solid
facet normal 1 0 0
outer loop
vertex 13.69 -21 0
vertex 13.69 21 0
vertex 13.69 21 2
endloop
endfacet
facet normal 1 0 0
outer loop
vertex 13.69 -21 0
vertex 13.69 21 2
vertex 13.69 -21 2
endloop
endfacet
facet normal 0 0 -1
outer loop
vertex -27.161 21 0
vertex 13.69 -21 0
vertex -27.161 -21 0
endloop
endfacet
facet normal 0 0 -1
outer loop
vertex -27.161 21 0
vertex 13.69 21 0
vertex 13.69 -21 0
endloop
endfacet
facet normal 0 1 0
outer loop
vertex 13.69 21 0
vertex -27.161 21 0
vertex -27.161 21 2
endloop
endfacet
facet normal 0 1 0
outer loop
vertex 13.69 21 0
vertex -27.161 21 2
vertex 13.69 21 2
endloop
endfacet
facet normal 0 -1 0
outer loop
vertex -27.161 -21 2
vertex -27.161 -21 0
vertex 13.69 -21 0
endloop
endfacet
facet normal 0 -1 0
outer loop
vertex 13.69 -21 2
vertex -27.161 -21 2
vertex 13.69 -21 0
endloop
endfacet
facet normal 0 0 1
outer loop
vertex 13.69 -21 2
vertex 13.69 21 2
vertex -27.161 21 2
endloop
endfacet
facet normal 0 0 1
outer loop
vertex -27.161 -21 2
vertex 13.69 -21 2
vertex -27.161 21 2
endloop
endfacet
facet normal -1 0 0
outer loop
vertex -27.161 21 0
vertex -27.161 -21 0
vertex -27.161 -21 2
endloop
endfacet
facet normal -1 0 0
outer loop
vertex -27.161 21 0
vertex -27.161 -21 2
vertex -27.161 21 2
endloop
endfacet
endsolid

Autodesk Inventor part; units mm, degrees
ref_plane "YZ Plane" through (0, 0, 0) normal (1, 0, 0) x (0, 1, 0)
ref_plane "XZ Plane" through (0, 0, 0) normal (0, 1, 0) x (-1, 0, 0)
ref_plane "XY Plane" through (0, 0, 0) normal (0, 0, 1) x (1, 0, 0)
sketch "Sketch1" plane through (0, 0, 0) normal (0, 0, 1) x (1, 0, 0)
  line L0 (-27.8673, 13.2738) -> (-22.4395, 22.145) projected
  line L1 (-27.3269, -6.928) -> (-27.3269, 3.472) projected
  line L2 (-20.8298, -22.6905) -> (-25.3728, -13.3353) projected
  line L3 (-7.65, -11.5) -> (7.65, -11.5) projected
  line L4 (7.65, 11.5) -> (-7.65, 11.5) projected
  arc A0 (0, 1.5) -> (0, -1.5) centre (0, 0) ccw projected
  line L5 (0, 1.5) -> (-30.65, 1.5) projected
  line L6 (-30.65, 11.5) -> (-30.65, 1.5) projected
  line L7 (-30.65, 11.5) -> (-7.65, 11.5) projected
  line L8 (-7.65, 25) -> (-7.65, 11.5) projected
  line L9 (-31.55, 25) -> (-7.65, 25) projected
  line L10 (-31.55, 25) -> (-31.55, -25) projected
  line L11 (-31.55, -25) -> (-7.65, -25) projected
  line L12 (-7.65, -11.5) -> (-7.65, -25) projected
  line L13 (-7.65, -11.5) -> (-30.65, -11.5) projected
  line L14 (-30.65, -1.5) -> (-30.65, -11.5) projected
  line L15 (-30.65, -1.5) -> (0, -1.5) projected
  line L16 (-27.3269, -1.728) -> (-27.3269, -40.6957)
  line L17 (-27.3269, -40.6957) -> (-27.3269, 31.6041)
  line L18 (-27.3269, 14.1571) -> (-22.4395, 22.145)
  line L19 (-25.3728, -13.3353) -> (-20.8298, -22.6905)
  line L20 (-25.3728, -13.3353) -> (-27.3269, -9.3114)
  line L21 (-7.65, 11.5) -> (7.65, 11.5)
  line L22 (7.65, 11.5) -> (7.65, -11.5)
  line L23 (7.65, -11.5) -> (-7.65, -11.5)
  line L24 (-7.65, -11.5) -> (-7.65, 11.5)
  line L25 (-7.65, 11.5) -> (-24.8832, 11.5)
  line L26 (-24.8832, 11.5) -> (-24.8832, -11.3233)
  line L27 (-24.8832, -11.3233) -> (-7.65, -11.3233)
  line L28 (-7.65, -11.3233) -> (-7.65, 11.5)
  line L29 (-16.2666, -11.3233) -> (-16.2666, 11.5)
  line L30 (-24.8832, -11.3233) -> (-20.8298, -20.1639)
  line L31 (-20.8298, -20.1639) -> (-9.3622, -20.1639)
  line L32 (-9.3622, -20.1639) -> (-9.3622, -11.3233)
  line L33 (-16.2666, 0.0883) -> (-13.6915, 0.0883)
  line L34 (-24.8832, 11.5) -> (-20.8298, 20.3406)
  line L35 (-20.8298, 20.3406) -> (-9.3622, 20.3406)
  line L36 (-9.3622, 20.3406) -> (-9.3622, 11.5)
  point P0 (0, 0)
  point P1 (-9.3622, -11.5)
extrude "Extrusion1" add sketch "Sketch1" along normal blind 2 contours L26 L5 L29 L15 | L15 L29 L27 L26 | L30 L27 L32 L13 | L13 L32 L31 L30 | L26 L7 L29 L5 | L29 L5 L24 L15 | L15 L24 L27 L29 | L32 L27 L24 L13 | L29 L7 L24 L5 | L34 L35 L36 L7 | L24 L5 A0 L15 | L15 A0 L5 L24 L4 L22 L3
sketch "Sketch2" plane through (0, 0, 2) normal (0, 0, 1) x (1, 0, 0)
  line L0 (-24.8832, -11.3233) -> (-20.8298, -20.1639) projected
  line L1 (-20.8298, -20.1639) -> (-9.3622, -20.1639) projected
  line L2 (-9.3622, -20.1639) -> (-9.3622, -11.5) projected
  line L3 (-9.3622, -11.5) -> (7.65, -11.5) projected
  line L4 (7.65, -11.5) -> (7.65, 11.5) projected
  line L5 (7.65, 11.5) -> (-9.3622, 11.5) projected
  line L6 (-9.3622, 11.5) -> (-9.3622, 20.3406) projected
  line L7 (-9.3622, 20.3406) -> (-20.8298, 20.3406) projected
  line L8 (-20.8298, 20.3406) -> (-24.8832, 11.5) projected
  line L9 (-24.8832, 11.5) -> (-24.8832, -11.3233) projected
  line L10 (-9.3622, 11.5) -> (-9.3622, 20.3406) projected
  line L11 (-9.3622, 20.3406) -> (7.65, 20.3406)
  line L12 (7.65, 20.3406) -> (7.65, -20.1639)
  line L13 (7.65, -20.1639) -> (-9.3622, -20.1639)
  line L14 (-9.3622, -20.1639) -> (-9.3622, 20.3406)
  point P0 (0, 0)
extrude "Extrusion2" add sketch "Sketch2" against normal blind 2 contours L2 L3 L12 L13 | L11 L12 L5 L6
sketch "Sketch3" plane through (0, 0, 0) normal (0, 0, -1) x (-1, 0, 0)
  circle A0 centre (4.3684, -8.4591) radius 1.5 projected
  circle A1 centre (4.3684, 8.4591) radius 1.5 projected
  point P0 (0, 0)
extrude "Extrusion3" cut sketch "Sketch3" against normal blind 2
sketch "Sketch4" plane through (0, 0, 0) normal (0, 0, -1) x (-1, 0, 0)
  line L0 (-14.69, 25) -> (-14.69, 12.5)
  line L1 (31.1608, -25) -> (7.65, -25) projected
  line L2 (-14.69, -25) -> (7.31, -25) projected
  line L3 (-14.69, 25) -> (31.1608, 25)
  line L4 (31.1608, 25) -> (31.1608, -25)
  line L5 (31.1608, -25) -> (-14.69, -25)
  line L6 (-14.69, -25) -> (-14.69, 25)
  line L7 (27.1608, 21) -> (-10.69, 21)
  line L8 (-10.69, 21) -> (-10.69, -21)
  line L9 (-10.69, -21) -> (27.1608, -21)
  line L10 (27.1608, -21) -> (27.1608, 21)
  line L11 (-10.69, 21) -> (-14.69, 21)
  line L12 (-10.69, -21) -> (-14.69, -21)
  line L13 (-14.69, 21) -> (-13.69, 21)
  line L14 (-13.69, 21) -> (-13.69, -21)
  point P0 (0, 0)
  dimension "d6" = 4
  dimension "d7" = 1
extrude "Extrusion4" add sketch "Sketch4" against normal up to surface (2 mm away) contours L11 L8 L12 L14 | L7 L10 L9 L8
properties part number "pcb"
